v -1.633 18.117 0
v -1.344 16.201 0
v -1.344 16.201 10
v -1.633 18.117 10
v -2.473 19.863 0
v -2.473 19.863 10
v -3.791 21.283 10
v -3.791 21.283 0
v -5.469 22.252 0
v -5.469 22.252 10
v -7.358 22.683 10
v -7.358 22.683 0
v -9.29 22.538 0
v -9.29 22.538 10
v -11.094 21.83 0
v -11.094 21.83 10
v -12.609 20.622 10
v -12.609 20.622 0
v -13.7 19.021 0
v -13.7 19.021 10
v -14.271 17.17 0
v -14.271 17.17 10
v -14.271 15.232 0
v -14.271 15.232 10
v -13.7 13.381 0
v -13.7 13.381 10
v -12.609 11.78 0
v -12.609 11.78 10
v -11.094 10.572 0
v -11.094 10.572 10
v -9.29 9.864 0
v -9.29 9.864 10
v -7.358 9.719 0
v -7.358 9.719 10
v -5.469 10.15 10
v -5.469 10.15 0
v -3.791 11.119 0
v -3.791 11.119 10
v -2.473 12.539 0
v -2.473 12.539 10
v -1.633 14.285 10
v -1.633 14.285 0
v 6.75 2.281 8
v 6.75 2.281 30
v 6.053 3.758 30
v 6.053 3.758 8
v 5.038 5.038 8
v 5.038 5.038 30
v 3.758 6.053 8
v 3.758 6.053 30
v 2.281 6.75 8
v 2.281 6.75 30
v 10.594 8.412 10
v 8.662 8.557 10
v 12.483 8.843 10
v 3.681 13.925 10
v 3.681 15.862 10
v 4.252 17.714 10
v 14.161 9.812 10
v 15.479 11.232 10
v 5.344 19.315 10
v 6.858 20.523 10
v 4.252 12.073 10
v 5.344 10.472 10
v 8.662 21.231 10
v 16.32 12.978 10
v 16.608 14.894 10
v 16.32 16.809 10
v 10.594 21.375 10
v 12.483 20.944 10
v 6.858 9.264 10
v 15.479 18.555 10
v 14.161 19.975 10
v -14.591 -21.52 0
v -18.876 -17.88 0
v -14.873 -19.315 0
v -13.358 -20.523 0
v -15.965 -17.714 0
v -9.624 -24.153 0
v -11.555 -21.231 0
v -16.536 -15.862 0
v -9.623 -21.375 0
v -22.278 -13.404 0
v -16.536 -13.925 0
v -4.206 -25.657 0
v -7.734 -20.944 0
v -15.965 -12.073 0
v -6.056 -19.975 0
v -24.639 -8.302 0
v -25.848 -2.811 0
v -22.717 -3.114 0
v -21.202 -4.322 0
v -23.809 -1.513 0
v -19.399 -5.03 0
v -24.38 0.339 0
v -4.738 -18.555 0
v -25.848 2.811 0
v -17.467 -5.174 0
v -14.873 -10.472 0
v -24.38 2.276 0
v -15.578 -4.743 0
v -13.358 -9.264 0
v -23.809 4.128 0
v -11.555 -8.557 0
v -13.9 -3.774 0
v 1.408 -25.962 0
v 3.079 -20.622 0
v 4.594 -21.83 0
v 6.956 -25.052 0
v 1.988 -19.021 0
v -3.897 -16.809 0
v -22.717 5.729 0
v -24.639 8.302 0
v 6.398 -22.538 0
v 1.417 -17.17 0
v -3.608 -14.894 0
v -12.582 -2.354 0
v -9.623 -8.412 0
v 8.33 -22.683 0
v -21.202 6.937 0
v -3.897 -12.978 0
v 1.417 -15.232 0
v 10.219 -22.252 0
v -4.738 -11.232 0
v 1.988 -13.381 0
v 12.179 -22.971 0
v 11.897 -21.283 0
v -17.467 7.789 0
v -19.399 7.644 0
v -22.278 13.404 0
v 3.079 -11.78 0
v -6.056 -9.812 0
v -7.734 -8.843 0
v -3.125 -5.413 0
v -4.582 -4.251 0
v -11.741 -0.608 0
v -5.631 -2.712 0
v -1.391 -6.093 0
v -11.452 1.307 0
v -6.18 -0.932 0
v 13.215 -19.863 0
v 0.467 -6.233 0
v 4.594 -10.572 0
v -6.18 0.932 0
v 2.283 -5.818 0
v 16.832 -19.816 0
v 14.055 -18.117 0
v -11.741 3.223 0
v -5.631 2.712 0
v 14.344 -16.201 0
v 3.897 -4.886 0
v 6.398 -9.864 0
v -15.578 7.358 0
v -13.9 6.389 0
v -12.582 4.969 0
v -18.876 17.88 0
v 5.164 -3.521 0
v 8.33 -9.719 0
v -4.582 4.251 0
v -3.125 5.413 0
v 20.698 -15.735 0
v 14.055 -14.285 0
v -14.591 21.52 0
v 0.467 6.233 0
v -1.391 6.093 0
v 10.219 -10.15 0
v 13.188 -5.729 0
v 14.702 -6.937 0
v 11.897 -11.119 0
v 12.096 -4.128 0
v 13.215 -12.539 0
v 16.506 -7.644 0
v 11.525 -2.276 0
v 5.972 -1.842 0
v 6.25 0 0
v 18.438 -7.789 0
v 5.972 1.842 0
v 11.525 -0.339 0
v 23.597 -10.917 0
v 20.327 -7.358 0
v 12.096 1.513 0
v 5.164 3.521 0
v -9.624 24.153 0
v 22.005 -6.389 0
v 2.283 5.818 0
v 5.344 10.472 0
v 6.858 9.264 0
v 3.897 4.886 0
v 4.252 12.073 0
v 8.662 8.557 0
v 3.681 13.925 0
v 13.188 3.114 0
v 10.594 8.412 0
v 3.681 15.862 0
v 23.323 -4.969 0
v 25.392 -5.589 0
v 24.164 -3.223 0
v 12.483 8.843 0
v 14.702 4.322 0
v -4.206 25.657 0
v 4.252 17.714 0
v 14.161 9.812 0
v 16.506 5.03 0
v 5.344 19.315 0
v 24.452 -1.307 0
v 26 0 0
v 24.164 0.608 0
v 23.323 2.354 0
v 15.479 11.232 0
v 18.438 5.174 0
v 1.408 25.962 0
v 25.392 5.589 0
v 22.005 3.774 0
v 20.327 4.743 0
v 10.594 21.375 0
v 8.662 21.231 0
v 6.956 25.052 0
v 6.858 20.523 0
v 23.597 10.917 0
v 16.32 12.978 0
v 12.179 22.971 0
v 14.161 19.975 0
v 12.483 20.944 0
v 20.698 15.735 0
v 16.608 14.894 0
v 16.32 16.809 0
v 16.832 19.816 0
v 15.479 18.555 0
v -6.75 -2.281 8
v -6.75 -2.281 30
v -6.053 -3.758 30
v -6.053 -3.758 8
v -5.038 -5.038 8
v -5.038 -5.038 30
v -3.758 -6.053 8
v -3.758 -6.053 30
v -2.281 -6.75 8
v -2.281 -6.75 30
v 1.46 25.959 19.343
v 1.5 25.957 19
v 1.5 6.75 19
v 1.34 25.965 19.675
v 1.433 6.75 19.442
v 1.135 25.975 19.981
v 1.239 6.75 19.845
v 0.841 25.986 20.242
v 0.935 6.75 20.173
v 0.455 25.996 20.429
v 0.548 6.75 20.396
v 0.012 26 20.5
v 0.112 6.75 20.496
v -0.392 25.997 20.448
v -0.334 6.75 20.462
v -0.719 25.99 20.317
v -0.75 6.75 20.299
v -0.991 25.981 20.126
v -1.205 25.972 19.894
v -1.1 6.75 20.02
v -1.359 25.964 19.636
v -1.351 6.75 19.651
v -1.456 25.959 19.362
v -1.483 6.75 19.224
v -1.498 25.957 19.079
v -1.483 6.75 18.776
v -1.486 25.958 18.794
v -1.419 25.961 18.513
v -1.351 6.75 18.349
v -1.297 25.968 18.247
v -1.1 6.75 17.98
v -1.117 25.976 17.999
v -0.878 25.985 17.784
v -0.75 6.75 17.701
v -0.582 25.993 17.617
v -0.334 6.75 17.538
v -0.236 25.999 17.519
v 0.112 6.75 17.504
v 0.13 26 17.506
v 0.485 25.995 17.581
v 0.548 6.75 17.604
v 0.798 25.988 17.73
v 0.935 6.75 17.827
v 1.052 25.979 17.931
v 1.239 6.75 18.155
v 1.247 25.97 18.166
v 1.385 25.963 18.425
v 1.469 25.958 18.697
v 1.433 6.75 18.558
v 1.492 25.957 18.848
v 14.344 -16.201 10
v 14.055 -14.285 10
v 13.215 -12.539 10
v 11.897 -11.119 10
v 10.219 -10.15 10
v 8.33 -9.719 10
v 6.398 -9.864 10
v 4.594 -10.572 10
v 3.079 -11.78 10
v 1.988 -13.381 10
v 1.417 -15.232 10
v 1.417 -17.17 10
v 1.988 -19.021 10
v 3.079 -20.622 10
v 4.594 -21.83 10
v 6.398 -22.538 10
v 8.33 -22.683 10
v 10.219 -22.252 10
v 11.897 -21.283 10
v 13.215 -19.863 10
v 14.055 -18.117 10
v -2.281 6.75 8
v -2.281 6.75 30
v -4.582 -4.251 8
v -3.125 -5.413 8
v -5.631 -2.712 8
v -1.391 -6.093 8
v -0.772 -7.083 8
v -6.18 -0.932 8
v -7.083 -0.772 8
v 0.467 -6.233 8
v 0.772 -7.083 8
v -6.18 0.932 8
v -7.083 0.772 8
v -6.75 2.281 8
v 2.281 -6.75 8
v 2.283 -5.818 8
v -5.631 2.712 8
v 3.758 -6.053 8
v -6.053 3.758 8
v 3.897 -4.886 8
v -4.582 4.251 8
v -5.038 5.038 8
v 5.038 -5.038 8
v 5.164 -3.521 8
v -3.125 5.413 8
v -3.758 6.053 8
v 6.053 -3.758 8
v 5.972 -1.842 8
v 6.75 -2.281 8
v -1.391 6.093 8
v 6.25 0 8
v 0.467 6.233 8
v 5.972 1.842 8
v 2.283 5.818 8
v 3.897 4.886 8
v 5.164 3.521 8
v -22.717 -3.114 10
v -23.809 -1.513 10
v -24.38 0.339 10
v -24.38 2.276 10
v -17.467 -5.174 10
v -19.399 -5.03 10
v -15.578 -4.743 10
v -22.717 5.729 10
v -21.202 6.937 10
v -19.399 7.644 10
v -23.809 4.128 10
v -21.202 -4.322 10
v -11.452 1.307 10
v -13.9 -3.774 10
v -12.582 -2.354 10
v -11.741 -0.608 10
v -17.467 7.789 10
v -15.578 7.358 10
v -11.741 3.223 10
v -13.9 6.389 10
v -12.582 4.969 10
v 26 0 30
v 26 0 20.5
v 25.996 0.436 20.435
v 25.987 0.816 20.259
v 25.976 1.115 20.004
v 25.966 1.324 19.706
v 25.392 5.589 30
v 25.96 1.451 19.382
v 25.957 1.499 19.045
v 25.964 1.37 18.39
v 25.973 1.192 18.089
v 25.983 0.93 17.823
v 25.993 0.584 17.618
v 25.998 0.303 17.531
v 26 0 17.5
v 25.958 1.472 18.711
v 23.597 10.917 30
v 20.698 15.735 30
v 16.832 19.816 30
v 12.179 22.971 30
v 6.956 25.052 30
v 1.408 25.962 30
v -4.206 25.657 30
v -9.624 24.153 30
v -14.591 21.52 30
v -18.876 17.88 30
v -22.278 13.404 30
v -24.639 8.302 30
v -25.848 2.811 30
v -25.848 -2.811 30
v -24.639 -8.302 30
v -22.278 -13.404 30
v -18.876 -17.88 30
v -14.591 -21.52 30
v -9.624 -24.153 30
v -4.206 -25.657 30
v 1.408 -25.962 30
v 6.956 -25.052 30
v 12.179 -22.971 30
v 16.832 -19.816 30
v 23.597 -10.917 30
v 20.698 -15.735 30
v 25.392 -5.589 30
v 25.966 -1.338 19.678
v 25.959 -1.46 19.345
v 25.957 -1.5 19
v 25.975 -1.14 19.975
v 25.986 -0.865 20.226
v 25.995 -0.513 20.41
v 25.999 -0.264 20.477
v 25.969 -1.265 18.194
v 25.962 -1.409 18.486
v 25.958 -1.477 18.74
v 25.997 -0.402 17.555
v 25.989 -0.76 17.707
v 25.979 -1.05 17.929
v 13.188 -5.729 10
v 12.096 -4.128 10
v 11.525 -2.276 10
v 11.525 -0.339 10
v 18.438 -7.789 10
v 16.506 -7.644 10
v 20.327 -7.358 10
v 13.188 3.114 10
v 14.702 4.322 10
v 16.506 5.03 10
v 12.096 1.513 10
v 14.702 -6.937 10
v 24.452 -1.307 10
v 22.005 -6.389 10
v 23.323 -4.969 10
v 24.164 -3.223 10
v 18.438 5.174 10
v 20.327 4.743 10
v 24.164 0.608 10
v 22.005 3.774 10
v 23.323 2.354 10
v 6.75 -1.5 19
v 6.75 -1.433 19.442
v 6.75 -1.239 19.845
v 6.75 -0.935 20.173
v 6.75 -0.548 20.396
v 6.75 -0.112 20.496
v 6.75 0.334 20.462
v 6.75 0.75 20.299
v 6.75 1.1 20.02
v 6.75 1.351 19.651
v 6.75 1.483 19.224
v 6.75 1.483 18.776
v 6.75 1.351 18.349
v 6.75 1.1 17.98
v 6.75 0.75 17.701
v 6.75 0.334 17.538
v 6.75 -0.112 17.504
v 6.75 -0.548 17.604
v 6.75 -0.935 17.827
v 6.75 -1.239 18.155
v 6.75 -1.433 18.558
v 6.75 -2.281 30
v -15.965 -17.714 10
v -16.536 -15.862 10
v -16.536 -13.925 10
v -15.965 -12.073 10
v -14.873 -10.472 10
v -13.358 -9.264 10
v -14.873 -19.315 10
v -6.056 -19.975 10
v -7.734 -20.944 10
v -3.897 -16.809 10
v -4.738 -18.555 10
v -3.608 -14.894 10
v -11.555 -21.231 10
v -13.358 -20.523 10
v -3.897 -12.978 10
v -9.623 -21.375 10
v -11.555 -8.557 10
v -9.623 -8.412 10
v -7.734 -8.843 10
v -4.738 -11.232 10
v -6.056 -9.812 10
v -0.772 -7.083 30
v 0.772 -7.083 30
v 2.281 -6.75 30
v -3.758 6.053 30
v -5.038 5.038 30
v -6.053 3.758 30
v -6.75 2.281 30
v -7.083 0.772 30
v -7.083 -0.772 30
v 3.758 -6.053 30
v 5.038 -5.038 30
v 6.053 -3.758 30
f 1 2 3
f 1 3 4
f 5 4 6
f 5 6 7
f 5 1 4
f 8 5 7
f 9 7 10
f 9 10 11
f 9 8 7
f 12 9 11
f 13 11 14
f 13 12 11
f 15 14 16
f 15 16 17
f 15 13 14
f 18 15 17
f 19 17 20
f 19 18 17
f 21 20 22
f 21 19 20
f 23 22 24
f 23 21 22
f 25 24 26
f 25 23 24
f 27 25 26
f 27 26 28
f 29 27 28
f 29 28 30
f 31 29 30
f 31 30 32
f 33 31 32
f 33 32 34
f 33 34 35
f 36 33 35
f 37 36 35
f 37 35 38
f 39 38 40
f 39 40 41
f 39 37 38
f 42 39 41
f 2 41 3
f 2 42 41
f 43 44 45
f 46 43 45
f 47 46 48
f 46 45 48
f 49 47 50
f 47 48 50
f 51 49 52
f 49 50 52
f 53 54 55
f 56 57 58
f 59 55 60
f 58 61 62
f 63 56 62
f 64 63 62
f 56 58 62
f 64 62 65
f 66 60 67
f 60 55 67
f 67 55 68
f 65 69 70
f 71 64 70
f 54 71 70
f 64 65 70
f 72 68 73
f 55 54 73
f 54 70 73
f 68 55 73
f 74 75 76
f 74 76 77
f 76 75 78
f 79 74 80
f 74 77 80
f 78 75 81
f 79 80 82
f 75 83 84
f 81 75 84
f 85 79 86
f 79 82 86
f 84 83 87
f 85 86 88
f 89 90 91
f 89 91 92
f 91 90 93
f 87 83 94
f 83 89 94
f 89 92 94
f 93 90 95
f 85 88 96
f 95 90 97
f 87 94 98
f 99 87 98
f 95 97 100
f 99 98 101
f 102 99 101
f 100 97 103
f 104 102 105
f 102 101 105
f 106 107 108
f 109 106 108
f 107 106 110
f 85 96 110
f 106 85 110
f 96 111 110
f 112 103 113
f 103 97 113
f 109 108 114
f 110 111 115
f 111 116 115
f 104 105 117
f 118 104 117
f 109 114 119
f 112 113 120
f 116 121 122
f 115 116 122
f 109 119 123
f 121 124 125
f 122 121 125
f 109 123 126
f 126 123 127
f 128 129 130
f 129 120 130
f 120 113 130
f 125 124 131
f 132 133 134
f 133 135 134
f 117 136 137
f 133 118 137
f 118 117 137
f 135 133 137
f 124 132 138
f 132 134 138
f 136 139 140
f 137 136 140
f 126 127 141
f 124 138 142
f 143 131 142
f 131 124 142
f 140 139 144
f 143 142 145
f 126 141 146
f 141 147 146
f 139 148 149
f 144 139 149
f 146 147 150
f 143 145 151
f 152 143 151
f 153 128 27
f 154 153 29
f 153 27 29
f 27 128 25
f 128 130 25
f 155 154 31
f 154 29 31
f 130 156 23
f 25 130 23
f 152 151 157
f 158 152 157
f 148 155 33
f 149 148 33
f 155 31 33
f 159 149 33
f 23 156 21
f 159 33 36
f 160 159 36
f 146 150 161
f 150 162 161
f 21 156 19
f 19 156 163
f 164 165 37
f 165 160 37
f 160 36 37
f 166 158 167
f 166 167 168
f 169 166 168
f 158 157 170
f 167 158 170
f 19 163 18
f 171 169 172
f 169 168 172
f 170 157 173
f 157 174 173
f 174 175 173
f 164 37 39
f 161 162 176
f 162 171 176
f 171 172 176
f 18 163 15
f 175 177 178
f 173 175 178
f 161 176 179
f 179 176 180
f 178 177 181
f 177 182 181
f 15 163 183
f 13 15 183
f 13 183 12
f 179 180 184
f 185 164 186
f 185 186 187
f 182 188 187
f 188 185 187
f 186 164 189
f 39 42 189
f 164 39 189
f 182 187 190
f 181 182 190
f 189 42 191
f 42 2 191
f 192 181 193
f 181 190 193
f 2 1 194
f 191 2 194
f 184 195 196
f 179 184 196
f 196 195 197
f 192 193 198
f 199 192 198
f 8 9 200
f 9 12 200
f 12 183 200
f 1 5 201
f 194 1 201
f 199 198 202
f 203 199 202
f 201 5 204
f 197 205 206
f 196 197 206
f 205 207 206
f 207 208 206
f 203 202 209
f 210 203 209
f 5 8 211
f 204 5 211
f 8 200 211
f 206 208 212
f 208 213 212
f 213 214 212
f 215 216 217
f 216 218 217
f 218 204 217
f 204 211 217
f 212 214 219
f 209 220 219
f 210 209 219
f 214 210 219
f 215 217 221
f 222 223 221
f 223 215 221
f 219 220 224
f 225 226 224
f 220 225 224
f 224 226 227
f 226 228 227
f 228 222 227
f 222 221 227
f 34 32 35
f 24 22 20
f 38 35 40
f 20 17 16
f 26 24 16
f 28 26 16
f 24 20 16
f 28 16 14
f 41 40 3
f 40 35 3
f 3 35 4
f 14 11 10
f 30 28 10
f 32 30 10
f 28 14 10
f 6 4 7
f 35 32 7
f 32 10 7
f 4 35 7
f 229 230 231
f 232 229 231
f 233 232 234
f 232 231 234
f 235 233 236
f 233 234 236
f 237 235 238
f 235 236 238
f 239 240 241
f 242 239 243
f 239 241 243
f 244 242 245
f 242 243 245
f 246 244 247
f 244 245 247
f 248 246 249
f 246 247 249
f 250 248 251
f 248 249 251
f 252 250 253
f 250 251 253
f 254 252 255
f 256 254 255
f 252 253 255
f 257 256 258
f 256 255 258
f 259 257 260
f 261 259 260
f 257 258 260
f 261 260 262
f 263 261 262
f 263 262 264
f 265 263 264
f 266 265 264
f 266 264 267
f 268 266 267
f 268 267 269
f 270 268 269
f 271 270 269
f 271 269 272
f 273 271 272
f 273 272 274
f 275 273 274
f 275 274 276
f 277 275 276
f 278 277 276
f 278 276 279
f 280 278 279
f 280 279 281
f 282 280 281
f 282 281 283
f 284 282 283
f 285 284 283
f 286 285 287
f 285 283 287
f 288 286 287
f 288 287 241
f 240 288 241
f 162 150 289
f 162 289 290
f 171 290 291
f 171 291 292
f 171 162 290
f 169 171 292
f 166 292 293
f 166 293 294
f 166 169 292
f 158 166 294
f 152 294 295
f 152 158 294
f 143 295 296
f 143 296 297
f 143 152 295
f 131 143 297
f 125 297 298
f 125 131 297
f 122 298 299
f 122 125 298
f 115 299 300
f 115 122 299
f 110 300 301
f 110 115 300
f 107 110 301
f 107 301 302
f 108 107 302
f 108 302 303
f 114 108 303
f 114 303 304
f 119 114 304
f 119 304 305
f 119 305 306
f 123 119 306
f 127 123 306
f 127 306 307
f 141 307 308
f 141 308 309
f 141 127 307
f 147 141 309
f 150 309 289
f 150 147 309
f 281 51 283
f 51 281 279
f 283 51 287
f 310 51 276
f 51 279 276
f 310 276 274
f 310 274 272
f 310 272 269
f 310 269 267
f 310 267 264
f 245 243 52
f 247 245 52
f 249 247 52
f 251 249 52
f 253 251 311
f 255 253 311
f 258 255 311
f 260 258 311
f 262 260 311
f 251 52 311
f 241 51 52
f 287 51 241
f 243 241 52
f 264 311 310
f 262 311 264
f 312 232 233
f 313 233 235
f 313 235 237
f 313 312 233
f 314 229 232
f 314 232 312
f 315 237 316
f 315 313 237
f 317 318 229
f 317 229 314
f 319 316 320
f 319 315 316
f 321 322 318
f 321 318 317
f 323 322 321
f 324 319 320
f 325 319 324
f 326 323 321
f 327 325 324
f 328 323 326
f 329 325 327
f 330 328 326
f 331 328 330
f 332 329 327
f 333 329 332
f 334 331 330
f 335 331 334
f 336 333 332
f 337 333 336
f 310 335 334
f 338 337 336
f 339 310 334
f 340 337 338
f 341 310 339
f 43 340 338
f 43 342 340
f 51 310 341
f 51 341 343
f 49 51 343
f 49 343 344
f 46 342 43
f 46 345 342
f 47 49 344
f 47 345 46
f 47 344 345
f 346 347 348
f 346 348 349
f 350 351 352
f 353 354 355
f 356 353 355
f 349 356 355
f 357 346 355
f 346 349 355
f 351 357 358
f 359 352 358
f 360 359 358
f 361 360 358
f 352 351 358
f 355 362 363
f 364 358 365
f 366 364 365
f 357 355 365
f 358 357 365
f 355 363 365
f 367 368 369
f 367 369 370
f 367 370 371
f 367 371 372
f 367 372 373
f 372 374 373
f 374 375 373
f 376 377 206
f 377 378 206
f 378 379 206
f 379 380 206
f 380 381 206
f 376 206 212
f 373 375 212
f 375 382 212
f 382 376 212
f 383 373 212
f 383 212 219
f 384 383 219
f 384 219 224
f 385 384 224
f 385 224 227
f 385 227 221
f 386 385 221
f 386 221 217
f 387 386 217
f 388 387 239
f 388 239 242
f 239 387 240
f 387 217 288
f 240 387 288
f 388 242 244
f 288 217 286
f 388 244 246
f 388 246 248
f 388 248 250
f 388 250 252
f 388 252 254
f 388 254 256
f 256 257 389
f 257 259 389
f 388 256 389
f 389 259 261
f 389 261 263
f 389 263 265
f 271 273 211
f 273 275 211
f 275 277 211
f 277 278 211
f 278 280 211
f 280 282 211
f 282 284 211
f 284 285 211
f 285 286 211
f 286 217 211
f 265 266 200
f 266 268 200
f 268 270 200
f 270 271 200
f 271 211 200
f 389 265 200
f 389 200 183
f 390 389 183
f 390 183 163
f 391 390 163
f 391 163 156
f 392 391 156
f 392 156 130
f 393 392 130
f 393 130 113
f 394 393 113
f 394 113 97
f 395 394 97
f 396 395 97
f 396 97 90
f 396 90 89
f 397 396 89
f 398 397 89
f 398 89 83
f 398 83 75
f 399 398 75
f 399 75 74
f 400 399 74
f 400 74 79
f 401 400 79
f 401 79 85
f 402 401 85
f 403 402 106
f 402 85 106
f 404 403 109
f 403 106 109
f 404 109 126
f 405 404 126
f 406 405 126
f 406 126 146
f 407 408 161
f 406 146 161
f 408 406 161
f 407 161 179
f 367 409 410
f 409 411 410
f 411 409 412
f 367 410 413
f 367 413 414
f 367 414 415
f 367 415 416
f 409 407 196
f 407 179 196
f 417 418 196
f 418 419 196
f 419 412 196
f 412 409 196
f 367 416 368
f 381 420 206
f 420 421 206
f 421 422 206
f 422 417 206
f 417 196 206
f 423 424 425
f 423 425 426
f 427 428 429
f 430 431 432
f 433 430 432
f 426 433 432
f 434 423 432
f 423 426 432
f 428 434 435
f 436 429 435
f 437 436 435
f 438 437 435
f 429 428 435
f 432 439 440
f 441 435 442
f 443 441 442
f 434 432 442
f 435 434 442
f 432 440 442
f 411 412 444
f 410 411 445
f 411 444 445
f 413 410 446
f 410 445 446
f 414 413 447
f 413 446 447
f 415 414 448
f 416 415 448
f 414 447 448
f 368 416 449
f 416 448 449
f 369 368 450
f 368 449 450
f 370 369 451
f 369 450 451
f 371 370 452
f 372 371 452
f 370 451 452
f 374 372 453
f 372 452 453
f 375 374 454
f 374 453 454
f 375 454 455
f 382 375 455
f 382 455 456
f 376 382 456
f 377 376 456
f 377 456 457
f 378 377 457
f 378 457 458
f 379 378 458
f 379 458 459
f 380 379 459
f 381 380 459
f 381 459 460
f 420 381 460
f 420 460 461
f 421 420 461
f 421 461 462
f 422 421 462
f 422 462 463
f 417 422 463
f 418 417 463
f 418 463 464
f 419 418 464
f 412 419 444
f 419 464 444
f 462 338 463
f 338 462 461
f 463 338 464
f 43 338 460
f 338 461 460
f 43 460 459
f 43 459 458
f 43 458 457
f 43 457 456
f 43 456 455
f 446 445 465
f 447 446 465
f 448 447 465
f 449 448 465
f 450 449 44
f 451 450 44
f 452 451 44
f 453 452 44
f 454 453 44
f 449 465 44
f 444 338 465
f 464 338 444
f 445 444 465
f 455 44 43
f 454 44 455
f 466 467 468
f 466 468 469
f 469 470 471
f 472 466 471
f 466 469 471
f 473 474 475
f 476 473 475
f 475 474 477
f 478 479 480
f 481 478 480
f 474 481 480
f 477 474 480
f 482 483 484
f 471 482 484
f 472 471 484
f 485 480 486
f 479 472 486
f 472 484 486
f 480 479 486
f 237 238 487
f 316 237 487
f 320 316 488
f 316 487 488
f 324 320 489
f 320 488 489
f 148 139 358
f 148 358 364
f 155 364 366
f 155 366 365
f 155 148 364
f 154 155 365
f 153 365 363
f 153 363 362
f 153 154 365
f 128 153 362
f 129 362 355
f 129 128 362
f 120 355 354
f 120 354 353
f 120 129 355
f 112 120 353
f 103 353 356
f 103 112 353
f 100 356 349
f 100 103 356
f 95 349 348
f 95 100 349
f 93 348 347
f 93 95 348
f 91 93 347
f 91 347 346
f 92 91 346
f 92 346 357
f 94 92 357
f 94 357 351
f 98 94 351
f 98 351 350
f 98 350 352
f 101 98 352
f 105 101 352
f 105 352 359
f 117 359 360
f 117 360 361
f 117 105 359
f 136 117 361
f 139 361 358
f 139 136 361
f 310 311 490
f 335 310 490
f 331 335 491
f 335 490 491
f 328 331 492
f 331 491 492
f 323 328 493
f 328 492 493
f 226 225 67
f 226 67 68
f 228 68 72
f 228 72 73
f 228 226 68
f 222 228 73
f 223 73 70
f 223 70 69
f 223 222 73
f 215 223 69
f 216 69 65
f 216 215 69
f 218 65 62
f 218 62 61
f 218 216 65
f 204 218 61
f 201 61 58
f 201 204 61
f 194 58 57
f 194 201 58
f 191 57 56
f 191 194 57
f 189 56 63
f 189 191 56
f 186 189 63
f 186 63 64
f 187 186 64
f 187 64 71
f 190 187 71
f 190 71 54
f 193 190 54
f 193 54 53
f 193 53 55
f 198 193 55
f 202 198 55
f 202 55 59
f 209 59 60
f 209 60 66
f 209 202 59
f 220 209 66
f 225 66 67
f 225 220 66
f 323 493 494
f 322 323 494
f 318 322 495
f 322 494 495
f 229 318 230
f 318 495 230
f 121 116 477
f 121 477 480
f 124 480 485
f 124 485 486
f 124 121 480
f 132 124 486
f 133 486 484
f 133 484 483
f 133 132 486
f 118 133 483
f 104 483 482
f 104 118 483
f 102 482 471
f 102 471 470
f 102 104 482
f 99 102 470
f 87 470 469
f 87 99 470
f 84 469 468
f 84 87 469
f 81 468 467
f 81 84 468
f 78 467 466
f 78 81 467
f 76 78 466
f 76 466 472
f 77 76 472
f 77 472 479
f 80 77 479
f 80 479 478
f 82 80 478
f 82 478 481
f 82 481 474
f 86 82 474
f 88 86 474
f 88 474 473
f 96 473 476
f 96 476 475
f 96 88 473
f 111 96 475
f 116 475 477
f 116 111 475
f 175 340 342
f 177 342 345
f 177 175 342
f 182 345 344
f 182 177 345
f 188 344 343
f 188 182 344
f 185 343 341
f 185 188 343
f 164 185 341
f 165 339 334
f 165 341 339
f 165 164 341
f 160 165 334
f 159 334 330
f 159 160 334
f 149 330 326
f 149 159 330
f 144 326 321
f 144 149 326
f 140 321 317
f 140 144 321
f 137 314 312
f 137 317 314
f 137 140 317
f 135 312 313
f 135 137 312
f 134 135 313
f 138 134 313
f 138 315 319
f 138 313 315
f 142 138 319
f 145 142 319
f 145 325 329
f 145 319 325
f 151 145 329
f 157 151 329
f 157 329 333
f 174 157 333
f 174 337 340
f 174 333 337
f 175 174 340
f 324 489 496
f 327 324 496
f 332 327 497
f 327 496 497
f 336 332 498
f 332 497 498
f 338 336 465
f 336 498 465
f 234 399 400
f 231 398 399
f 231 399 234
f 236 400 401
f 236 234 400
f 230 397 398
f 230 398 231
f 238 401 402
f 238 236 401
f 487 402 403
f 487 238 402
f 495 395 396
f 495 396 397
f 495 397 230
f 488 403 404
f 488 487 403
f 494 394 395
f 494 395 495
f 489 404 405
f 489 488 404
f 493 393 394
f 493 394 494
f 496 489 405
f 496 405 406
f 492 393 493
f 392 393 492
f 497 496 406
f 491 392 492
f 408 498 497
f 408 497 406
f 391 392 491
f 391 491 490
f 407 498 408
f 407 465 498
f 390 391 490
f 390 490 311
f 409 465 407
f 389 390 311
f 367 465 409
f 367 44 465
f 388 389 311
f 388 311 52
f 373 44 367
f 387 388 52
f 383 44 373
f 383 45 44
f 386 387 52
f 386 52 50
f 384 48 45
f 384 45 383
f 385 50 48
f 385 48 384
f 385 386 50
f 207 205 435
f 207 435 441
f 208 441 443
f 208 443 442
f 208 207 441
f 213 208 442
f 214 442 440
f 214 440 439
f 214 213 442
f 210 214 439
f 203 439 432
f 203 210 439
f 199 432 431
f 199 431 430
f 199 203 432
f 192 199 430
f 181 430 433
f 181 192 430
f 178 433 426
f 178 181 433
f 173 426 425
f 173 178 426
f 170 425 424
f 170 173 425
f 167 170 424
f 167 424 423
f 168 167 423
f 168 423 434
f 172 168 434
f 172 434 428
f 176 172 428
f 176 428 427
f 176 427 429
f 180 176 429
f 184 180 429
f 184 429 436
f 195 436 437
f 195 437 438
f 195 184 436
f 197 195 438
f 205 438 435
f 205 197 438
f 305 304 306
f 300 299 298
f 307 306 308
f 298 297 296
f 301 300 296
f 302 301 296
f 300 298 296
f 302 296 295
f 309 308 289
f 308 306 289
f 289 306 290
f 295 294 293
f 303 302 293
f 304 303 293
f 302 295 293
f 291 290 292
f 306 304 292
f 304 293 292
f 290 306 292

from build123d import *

# Parameters (mm, degrees)
F0_R      = 26
F0_R_2    = 6.25
F1_DEPTH  = 30
F3_DEPTH  = 25
F4_DEPTH  = 22
F5_R      = 1.5
F6_DEPTH  = 25
F7_R      = 1.5
F8_DEPTH  = 25
F9_R      = 6.5
F10_DEPTH = 10


with BuildPart() as f1:
    # F0 (on Top) → F1 (new body)
    with BuildSketch(Plane.XY):
        Circle(F0_R)
        Circle(F0_R_2, mode=Mode.SUBTRACT)
        Circle(F0_R_2)
    extrude(amount=F1_DEPTH)

    # F0 (on Top) → F3 (cut)
    with BuildSketch(Plane.XY):
        Circle(F0_R_2)
    extrude(amount=F3_DEPTH, mode=Mode.SUBTRACT)

    # F2 (on face) → F4 (cut)
    with BuildSketch(Plane.XY.offset(30)):
        with BuildLine():
            Line((6.75, -2.2810359489), (6.75, 2.2810359489))
            ThreePointArc((6.75, 2.2810359489), (5.038135816, 5.038135816), (2.2810359489, 6.75))
            Line((2.2810359489, 6.75), (-2.2810359489, 6.75))
            ThreePointArc((-2.2810359489, 6.75), (-5.038135816, 5.038135816), (-6.75, 2.2810359489))
            Line((-6.75, 2.2810359489), (-6.75, -2.2810359489))
            ThreePointArc((-6.75, -2.2810359489), (-5.038135816, -5.038135816), (-2.2810359489, -6.75))
            Line((-2.2810359489, -6.75), (2.2810359489, -6.75))
            ThreePointArc((2.2810359489, -6.75), (5.038135816, -5.038135816), (6.75, -2.2810359489))
        make_face()
        with BuildLine():
            Line((-6.75, -2.2810359489), (-6.75, 2.2810359489))
            ThreePointArc((-6.75, 2.2810359489), (-7.125, 0), (-6.75, -2.2810359489))
        make_face()
        with BuildLine():
            ThreePointArc((-2.2810359489, -6.75), (0, -7.125), (2.2810359489, -6.75))
            Line((2.2810359489, -6.75), (-2.2810359489, -6.75))
        make_face()
    extrude(amount=-F4_DEPTH, mode=Mode.SUBTRACT)

    # F5 (on face) → F6 (cut)
    with BuildSketch(Plane(origin=(6.75, 0, 0), x_dir=(0, -1, 0), z_dir=(-1, 0, 0))):
        with Locations((0, 19)):
            Circle(F5_R)
    extrude(amount=-F6_DEPTH, mode=Mode.SUBTRACT)

    # F7 (on face) → F8 (cut)
    with BuildSketch(Plane.XZ.offset(-6.75)):
        with Locations((0, 19)):
            Circle(F7_R)
    extrude(amount=-F8_DEPTH, mode=Mode.SUBTRACT)

    # F9 (on face) → F10 (cut)
    with BuildSketch(Plane.XY):
        with Locations((-7.8439684669, 16.2009925218)):
            Circle(F9_R)
        with Locations((10.1084868569, 14.8935722197)):
            Circle(F9_R)
        with Locations((17.9524553238, -1.3074203021)):
            Circle(F9_R)
        with Locations((7.8439684669, -16.2009925218)):
            Circle(F9_R)
        with Locations((-10.1084868569, -14.8935722197)):
            Circle(F9_R)
        with Locations((-17.9524553238, 1.3074203021)):
            Circle(F9_R)
    extrude(amount=F10_DEPTH, mode=Mode.SUBTRACT)


solid = f1.part
